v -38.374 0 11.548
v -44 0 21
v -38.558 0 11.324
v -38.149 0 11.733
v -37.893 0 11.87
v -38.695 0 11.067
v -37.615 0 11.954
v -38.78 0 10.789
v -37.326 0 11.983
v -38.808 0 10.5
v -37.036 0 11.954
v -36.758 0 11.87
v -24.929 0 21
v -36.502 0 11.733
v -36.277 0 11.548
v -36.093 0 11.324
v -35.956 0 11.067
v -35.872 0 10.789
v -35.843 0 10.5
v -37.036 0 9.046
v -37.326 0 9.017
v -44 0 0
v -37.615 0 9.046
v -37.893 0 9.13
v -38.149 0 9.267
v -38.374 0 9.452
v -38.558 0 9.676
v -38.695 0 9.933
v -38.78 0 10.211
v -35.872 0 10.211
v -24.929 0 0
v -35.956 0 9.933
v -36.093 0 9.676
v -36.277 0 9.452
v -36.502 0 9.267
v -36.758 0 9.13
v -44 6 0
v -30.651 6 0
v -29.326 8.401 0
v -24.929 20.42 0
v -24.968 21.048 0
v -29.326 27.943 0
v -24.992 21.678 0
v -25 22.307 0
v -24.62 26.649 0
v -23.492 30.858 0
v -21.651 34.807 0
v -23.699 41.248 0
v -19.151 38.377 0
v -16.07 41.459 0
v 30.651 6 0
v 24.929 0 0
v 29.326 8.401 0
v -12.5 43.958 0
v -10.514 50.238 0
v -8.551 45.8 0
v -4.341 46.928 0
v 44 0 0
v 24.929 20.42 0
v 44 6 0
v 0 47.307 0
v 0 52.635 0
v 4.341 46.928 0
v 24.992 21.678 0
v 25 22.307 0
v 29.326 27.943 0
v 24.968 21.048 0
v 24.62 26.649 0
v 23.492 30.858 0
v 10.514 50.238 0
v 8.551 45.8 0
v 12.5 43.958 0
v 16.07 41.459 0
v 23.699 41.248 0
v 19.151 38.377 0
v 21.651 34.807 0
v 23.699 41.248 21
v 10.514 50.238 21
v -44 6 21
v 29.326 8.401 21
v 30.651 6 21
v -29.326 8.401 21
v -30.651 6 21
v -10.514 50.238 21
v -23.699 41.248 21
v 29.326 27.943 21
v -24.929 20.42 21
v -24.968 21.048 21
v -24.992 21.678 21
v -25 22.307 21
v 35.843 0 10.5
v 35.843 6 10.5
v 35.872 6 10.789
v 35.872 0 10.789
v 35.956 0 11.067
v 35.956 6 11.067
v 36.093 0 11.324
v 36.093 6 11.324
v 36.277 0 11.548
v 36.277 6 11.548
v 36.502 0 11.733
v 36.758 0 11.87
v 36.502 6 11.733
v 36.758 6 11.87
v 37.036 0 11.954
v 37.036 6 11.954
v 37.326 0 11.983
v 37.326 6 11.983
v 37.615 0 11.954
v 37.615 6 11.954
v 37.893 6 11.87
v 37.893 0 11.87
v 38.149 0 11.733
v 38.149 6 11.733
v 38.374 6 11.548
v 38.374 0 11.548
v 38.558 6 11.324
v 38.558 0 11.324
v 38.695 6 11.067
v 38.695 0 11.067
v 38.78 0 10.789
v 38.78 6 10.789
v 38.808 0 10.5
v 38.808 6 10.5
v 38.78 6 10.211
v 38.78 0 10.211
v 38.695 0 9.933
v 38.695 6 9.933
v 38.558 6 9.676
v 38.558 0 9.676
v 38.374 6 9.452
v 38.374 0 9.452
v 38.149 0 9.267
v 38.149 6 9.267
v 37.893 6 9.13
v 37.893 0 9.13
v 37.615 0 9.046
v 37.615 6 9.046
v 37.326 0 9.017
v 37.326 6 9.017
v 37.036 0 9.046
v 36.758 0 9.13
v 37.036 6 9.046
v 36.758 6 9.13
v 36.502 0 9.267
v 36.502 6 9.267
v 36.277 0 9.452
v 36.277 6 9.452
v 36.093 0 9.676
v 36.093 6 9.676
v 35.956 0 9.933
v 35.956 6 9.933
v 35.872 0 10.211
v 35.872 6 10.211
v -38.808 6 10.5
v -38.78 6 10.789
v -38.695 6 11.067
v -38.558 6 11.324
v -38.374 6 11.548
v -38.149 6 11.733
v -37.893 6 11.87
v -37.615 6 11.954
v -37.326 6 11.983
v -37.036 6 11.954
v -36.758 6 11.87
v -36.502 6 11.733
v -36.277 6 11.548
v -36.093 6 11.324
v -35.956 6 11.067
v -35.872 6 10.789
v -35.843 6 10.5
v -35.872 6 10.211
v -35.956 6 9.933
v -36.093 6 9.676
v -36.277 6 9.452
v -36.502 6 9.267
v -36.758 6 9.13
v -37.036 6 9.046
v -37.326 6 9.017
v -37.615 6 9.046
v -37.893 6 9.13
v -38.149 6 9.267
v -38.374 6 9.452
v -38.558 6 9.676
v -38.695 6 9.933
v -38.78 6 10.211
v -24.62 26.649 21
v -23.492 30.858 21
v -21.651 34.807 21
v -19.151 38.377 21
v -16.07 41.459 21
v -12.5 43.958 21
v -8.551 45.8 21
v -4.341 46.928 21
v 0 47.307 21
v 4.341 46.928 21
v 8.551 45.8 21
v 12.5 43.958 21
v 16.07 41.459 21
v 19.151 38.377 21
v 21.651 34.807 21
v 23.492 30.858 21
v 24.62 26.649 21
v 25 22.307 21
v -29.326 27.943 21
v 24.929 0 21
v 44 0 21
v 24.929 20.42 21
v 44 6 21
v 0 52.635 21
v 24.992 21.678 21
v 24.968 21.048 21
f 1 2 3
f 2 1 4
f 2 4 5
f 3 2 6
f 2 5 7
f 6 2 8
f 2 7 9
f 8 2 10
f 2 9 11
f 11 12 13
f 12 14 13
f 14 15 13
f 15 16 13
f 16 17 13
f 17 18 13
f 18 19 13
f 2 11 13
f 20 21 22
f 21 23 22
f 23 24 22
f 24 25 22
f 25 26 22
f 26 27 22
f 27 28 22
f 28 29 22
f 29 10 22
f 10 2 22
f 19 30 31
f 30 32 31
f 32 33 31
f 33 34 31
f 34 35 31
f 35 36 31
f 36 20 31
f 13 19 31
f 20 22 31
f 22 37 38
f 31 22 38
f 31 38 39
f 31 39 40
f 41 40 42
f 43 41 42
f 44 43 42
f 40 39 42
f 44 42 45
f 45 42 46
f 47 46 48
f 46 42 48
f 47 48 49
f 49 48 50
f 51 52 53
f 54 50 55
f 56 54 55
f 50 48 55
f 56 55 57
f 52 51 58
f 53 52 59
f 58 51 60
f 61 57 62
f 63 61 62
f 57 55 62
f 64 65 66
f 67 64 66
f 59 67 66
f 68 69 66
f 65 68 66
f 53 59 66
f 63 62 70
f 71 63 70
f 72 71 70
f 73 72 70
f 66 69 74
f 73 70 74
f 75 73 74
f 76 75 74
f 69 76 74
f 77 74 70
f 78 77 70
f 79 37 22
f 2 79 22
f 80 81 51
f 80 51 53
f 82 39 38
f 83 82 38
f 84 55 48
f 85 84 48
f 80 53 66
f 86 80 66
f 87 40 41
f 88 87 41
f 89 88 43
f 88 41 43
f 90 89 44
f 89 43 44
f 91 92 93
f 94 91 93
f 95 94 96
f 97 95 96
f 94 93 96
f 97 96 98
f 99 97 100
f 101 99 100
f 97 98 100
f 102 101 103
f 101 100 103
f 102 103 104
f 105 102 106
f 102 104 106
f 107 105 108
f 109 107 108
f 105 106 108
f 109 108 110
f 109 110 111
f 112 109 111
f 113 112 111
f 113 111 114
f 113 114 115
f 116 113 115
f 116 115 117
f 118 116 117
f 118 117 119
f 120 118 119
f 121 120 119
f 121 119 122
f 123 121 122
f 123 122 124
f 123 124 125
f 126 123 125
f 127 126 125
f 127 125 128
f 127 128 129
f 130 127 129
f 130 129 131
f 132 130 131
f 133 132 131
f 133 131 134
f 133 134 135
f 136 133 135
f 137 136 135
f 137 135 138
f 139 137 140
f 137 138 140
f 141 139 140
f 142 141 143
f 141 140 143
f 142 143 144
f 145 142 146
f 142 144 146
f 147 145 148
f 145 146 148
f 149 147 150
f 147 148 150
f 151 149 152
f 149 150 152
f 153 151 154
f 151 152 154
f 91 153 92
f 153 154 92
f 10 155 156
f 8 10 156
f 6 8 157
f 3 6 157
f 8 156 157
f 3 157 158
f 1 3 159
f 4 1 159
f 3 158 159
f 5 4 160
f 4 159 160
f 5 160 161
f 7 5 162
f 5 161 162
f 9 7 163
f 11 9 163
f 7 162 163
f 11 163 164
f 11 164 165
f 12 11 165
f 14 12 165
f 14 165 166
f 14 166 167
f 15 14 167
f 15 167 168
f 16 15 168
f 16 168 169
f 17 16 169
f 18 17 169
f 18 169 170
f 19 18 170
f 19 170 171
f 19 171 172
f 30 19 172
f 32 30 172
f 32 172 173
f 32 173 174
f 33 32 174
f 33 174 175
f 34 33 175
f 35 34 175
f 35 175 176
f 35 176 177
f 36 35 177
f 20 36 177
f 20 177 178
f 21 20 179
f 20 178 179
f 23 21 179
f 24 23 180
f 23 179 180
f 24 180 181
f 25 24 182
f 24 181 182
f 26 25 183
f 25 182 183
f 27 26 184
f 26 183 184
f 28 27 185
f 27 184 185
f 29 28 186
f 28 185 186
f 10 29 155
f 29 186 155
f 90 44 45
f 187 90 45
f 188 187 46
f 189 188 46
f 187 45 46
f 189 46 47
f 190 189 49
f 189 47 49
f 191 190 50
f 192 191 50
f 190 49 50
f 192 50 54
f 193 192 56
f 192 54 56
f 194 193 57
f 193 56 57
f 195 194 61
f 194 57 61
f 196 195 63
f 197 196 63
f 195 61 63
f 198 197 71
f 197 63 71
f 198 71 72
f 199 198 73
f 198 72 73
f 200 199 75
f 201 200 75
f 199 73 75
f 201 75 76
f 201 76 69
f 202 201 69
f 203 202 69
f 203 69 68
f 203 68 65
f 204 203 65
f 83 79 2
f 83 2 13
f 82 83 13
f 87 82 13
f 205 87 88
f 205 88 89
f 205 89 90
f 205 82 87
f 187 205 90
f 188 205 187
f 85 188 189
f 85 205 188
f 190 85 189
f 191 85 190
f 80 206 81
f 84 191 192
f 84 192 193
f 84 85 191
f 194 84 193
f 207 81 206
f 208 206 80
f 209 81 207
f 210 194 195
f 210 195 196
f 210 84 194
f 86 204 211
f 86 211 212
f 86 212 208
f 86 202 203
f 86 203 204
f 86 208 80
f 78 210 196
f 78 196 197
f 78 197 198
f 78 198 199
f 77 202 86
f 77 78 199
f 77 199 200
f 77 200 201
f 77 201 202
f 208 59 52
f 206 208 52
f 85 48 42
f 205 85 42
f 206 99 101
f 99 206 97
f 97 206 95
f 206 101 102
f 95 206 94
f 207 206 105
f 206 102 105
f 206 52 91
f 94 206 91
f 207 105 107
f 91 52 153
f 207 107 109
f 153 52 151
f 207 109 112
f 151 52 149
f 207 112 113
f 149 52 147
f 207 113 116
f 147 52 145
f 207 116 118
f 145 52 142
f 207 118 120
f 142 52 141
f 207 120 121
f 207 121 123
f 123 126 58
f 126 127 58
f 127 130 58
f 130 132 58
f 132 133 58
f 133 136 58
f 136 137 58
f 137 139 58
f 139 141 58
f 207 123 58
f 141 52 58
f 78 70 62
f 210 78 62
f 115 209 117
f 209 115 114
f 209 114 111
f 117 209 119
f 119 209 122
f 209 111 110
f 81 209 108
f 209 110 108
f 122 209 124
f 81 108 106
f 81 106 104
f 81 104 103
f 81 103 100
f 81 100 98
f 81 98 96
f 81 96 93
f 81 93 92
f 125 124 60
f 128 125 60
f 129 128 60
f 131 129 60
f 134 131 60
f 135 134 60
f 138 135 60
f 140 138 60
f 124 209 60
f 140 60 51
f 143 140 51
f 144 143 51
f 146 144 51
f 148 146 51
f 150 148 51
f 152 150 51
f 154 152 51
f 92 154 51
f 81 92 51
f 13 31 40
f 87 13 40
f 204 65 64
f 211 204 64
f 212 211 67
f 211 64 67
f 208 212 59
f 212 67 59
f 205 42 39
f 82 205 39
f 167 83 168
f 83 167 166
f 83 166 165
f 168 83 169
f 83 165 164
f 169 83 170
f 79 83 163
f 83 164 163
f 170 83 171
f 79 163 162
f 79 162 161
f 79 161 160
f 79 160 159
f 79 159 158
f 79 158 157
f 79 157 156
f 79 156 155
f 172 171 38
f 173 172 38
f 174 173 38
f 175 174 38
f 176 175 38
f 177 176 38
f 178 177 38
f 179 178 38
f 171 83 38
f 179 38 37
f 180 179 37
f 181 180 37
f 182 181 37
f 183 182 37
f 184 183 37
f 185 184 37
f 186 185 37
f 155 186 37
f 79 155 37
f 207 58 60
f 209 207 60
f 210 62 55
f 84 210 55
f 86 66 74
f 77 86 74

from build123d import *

# Parameters (mm, degrees)
F1_DEPTH = 21
F2_R     = 1.482571
F3_DEPTH = 6.001


with BuildPart() as f1:
    # F0 (on Top) → F1 (new body)
    with BuildSketch(Plane.XY):
        with BuildLine():
            ThreePointArc((25, 22.307473), (24.982152, 21.362986), (24.928635, 20.419847))
            Line((24.928635, 20.419847), (24.928635, 0))
            Line((24.928635, 0), (28, 0))
            Line((28, 0), (44, 0))
            Line((44, 0), (44, 6))
            Line((44, 6), (30.651433, 6))
            Line((30.651433, 6), (29.325717, 8.401437))
            Line((29.325717, 8.401437), (29.325717, 27.943285))
            Line((29.325717, 27.943285), (23.699379, 41.248079))
            Line((23.699379, 41.248079), (10.514447, 50.237805))
            Line((10.514447, 50.237805), (0, 52.635066))
            Line((0, 52.635066), (-10.514447, 50.237805))
            Line((-10.514447, 50.237805), (-23.699379, 41.248079))
            Line((-23.699379, 41.248079), (-29.325717, 27.943285))
            Line((-29.325717, 27.943285), (-29.325717, 8.401437))
            Line((-29.325717, 8.401437), (-30.651433, 6))
            Line((-30.651433, 6), (-44, 6))
            Line((-44, 6), (-44, 0))
            Line((-44, 0), (-28, 0))
            Line((-28, 0), (-24.928635, 0))
            Line((-24.928635, 0), (-24.928635, 20.419847))
            ThreePointArc((-24.928635, 20.419847), (-24.982152, 21.362986), (-25, 22.307473))
            ThreePointArc((-25, 22.307473), (0, 47.307473), (25, 22.307473))
        make_face()
    extrude(amount=F1_DEPTH)

    # F2 (on face) → F3 (cut, through all)
    with BuildSketch(Plane(origin=(0, 6, 0), x_dir=(-1, 0, 0), z_dir=(0, 1, 0))):
        with Locations((-37.325717, 10.5)):
            Circle(F2_R)
        with Locations((37.325717, 10.5)):
            Circle(F2_R)
    extrude(amount=-F3_DEPTH, mode=Mode.SUBTRACT)


solid = f1.part
